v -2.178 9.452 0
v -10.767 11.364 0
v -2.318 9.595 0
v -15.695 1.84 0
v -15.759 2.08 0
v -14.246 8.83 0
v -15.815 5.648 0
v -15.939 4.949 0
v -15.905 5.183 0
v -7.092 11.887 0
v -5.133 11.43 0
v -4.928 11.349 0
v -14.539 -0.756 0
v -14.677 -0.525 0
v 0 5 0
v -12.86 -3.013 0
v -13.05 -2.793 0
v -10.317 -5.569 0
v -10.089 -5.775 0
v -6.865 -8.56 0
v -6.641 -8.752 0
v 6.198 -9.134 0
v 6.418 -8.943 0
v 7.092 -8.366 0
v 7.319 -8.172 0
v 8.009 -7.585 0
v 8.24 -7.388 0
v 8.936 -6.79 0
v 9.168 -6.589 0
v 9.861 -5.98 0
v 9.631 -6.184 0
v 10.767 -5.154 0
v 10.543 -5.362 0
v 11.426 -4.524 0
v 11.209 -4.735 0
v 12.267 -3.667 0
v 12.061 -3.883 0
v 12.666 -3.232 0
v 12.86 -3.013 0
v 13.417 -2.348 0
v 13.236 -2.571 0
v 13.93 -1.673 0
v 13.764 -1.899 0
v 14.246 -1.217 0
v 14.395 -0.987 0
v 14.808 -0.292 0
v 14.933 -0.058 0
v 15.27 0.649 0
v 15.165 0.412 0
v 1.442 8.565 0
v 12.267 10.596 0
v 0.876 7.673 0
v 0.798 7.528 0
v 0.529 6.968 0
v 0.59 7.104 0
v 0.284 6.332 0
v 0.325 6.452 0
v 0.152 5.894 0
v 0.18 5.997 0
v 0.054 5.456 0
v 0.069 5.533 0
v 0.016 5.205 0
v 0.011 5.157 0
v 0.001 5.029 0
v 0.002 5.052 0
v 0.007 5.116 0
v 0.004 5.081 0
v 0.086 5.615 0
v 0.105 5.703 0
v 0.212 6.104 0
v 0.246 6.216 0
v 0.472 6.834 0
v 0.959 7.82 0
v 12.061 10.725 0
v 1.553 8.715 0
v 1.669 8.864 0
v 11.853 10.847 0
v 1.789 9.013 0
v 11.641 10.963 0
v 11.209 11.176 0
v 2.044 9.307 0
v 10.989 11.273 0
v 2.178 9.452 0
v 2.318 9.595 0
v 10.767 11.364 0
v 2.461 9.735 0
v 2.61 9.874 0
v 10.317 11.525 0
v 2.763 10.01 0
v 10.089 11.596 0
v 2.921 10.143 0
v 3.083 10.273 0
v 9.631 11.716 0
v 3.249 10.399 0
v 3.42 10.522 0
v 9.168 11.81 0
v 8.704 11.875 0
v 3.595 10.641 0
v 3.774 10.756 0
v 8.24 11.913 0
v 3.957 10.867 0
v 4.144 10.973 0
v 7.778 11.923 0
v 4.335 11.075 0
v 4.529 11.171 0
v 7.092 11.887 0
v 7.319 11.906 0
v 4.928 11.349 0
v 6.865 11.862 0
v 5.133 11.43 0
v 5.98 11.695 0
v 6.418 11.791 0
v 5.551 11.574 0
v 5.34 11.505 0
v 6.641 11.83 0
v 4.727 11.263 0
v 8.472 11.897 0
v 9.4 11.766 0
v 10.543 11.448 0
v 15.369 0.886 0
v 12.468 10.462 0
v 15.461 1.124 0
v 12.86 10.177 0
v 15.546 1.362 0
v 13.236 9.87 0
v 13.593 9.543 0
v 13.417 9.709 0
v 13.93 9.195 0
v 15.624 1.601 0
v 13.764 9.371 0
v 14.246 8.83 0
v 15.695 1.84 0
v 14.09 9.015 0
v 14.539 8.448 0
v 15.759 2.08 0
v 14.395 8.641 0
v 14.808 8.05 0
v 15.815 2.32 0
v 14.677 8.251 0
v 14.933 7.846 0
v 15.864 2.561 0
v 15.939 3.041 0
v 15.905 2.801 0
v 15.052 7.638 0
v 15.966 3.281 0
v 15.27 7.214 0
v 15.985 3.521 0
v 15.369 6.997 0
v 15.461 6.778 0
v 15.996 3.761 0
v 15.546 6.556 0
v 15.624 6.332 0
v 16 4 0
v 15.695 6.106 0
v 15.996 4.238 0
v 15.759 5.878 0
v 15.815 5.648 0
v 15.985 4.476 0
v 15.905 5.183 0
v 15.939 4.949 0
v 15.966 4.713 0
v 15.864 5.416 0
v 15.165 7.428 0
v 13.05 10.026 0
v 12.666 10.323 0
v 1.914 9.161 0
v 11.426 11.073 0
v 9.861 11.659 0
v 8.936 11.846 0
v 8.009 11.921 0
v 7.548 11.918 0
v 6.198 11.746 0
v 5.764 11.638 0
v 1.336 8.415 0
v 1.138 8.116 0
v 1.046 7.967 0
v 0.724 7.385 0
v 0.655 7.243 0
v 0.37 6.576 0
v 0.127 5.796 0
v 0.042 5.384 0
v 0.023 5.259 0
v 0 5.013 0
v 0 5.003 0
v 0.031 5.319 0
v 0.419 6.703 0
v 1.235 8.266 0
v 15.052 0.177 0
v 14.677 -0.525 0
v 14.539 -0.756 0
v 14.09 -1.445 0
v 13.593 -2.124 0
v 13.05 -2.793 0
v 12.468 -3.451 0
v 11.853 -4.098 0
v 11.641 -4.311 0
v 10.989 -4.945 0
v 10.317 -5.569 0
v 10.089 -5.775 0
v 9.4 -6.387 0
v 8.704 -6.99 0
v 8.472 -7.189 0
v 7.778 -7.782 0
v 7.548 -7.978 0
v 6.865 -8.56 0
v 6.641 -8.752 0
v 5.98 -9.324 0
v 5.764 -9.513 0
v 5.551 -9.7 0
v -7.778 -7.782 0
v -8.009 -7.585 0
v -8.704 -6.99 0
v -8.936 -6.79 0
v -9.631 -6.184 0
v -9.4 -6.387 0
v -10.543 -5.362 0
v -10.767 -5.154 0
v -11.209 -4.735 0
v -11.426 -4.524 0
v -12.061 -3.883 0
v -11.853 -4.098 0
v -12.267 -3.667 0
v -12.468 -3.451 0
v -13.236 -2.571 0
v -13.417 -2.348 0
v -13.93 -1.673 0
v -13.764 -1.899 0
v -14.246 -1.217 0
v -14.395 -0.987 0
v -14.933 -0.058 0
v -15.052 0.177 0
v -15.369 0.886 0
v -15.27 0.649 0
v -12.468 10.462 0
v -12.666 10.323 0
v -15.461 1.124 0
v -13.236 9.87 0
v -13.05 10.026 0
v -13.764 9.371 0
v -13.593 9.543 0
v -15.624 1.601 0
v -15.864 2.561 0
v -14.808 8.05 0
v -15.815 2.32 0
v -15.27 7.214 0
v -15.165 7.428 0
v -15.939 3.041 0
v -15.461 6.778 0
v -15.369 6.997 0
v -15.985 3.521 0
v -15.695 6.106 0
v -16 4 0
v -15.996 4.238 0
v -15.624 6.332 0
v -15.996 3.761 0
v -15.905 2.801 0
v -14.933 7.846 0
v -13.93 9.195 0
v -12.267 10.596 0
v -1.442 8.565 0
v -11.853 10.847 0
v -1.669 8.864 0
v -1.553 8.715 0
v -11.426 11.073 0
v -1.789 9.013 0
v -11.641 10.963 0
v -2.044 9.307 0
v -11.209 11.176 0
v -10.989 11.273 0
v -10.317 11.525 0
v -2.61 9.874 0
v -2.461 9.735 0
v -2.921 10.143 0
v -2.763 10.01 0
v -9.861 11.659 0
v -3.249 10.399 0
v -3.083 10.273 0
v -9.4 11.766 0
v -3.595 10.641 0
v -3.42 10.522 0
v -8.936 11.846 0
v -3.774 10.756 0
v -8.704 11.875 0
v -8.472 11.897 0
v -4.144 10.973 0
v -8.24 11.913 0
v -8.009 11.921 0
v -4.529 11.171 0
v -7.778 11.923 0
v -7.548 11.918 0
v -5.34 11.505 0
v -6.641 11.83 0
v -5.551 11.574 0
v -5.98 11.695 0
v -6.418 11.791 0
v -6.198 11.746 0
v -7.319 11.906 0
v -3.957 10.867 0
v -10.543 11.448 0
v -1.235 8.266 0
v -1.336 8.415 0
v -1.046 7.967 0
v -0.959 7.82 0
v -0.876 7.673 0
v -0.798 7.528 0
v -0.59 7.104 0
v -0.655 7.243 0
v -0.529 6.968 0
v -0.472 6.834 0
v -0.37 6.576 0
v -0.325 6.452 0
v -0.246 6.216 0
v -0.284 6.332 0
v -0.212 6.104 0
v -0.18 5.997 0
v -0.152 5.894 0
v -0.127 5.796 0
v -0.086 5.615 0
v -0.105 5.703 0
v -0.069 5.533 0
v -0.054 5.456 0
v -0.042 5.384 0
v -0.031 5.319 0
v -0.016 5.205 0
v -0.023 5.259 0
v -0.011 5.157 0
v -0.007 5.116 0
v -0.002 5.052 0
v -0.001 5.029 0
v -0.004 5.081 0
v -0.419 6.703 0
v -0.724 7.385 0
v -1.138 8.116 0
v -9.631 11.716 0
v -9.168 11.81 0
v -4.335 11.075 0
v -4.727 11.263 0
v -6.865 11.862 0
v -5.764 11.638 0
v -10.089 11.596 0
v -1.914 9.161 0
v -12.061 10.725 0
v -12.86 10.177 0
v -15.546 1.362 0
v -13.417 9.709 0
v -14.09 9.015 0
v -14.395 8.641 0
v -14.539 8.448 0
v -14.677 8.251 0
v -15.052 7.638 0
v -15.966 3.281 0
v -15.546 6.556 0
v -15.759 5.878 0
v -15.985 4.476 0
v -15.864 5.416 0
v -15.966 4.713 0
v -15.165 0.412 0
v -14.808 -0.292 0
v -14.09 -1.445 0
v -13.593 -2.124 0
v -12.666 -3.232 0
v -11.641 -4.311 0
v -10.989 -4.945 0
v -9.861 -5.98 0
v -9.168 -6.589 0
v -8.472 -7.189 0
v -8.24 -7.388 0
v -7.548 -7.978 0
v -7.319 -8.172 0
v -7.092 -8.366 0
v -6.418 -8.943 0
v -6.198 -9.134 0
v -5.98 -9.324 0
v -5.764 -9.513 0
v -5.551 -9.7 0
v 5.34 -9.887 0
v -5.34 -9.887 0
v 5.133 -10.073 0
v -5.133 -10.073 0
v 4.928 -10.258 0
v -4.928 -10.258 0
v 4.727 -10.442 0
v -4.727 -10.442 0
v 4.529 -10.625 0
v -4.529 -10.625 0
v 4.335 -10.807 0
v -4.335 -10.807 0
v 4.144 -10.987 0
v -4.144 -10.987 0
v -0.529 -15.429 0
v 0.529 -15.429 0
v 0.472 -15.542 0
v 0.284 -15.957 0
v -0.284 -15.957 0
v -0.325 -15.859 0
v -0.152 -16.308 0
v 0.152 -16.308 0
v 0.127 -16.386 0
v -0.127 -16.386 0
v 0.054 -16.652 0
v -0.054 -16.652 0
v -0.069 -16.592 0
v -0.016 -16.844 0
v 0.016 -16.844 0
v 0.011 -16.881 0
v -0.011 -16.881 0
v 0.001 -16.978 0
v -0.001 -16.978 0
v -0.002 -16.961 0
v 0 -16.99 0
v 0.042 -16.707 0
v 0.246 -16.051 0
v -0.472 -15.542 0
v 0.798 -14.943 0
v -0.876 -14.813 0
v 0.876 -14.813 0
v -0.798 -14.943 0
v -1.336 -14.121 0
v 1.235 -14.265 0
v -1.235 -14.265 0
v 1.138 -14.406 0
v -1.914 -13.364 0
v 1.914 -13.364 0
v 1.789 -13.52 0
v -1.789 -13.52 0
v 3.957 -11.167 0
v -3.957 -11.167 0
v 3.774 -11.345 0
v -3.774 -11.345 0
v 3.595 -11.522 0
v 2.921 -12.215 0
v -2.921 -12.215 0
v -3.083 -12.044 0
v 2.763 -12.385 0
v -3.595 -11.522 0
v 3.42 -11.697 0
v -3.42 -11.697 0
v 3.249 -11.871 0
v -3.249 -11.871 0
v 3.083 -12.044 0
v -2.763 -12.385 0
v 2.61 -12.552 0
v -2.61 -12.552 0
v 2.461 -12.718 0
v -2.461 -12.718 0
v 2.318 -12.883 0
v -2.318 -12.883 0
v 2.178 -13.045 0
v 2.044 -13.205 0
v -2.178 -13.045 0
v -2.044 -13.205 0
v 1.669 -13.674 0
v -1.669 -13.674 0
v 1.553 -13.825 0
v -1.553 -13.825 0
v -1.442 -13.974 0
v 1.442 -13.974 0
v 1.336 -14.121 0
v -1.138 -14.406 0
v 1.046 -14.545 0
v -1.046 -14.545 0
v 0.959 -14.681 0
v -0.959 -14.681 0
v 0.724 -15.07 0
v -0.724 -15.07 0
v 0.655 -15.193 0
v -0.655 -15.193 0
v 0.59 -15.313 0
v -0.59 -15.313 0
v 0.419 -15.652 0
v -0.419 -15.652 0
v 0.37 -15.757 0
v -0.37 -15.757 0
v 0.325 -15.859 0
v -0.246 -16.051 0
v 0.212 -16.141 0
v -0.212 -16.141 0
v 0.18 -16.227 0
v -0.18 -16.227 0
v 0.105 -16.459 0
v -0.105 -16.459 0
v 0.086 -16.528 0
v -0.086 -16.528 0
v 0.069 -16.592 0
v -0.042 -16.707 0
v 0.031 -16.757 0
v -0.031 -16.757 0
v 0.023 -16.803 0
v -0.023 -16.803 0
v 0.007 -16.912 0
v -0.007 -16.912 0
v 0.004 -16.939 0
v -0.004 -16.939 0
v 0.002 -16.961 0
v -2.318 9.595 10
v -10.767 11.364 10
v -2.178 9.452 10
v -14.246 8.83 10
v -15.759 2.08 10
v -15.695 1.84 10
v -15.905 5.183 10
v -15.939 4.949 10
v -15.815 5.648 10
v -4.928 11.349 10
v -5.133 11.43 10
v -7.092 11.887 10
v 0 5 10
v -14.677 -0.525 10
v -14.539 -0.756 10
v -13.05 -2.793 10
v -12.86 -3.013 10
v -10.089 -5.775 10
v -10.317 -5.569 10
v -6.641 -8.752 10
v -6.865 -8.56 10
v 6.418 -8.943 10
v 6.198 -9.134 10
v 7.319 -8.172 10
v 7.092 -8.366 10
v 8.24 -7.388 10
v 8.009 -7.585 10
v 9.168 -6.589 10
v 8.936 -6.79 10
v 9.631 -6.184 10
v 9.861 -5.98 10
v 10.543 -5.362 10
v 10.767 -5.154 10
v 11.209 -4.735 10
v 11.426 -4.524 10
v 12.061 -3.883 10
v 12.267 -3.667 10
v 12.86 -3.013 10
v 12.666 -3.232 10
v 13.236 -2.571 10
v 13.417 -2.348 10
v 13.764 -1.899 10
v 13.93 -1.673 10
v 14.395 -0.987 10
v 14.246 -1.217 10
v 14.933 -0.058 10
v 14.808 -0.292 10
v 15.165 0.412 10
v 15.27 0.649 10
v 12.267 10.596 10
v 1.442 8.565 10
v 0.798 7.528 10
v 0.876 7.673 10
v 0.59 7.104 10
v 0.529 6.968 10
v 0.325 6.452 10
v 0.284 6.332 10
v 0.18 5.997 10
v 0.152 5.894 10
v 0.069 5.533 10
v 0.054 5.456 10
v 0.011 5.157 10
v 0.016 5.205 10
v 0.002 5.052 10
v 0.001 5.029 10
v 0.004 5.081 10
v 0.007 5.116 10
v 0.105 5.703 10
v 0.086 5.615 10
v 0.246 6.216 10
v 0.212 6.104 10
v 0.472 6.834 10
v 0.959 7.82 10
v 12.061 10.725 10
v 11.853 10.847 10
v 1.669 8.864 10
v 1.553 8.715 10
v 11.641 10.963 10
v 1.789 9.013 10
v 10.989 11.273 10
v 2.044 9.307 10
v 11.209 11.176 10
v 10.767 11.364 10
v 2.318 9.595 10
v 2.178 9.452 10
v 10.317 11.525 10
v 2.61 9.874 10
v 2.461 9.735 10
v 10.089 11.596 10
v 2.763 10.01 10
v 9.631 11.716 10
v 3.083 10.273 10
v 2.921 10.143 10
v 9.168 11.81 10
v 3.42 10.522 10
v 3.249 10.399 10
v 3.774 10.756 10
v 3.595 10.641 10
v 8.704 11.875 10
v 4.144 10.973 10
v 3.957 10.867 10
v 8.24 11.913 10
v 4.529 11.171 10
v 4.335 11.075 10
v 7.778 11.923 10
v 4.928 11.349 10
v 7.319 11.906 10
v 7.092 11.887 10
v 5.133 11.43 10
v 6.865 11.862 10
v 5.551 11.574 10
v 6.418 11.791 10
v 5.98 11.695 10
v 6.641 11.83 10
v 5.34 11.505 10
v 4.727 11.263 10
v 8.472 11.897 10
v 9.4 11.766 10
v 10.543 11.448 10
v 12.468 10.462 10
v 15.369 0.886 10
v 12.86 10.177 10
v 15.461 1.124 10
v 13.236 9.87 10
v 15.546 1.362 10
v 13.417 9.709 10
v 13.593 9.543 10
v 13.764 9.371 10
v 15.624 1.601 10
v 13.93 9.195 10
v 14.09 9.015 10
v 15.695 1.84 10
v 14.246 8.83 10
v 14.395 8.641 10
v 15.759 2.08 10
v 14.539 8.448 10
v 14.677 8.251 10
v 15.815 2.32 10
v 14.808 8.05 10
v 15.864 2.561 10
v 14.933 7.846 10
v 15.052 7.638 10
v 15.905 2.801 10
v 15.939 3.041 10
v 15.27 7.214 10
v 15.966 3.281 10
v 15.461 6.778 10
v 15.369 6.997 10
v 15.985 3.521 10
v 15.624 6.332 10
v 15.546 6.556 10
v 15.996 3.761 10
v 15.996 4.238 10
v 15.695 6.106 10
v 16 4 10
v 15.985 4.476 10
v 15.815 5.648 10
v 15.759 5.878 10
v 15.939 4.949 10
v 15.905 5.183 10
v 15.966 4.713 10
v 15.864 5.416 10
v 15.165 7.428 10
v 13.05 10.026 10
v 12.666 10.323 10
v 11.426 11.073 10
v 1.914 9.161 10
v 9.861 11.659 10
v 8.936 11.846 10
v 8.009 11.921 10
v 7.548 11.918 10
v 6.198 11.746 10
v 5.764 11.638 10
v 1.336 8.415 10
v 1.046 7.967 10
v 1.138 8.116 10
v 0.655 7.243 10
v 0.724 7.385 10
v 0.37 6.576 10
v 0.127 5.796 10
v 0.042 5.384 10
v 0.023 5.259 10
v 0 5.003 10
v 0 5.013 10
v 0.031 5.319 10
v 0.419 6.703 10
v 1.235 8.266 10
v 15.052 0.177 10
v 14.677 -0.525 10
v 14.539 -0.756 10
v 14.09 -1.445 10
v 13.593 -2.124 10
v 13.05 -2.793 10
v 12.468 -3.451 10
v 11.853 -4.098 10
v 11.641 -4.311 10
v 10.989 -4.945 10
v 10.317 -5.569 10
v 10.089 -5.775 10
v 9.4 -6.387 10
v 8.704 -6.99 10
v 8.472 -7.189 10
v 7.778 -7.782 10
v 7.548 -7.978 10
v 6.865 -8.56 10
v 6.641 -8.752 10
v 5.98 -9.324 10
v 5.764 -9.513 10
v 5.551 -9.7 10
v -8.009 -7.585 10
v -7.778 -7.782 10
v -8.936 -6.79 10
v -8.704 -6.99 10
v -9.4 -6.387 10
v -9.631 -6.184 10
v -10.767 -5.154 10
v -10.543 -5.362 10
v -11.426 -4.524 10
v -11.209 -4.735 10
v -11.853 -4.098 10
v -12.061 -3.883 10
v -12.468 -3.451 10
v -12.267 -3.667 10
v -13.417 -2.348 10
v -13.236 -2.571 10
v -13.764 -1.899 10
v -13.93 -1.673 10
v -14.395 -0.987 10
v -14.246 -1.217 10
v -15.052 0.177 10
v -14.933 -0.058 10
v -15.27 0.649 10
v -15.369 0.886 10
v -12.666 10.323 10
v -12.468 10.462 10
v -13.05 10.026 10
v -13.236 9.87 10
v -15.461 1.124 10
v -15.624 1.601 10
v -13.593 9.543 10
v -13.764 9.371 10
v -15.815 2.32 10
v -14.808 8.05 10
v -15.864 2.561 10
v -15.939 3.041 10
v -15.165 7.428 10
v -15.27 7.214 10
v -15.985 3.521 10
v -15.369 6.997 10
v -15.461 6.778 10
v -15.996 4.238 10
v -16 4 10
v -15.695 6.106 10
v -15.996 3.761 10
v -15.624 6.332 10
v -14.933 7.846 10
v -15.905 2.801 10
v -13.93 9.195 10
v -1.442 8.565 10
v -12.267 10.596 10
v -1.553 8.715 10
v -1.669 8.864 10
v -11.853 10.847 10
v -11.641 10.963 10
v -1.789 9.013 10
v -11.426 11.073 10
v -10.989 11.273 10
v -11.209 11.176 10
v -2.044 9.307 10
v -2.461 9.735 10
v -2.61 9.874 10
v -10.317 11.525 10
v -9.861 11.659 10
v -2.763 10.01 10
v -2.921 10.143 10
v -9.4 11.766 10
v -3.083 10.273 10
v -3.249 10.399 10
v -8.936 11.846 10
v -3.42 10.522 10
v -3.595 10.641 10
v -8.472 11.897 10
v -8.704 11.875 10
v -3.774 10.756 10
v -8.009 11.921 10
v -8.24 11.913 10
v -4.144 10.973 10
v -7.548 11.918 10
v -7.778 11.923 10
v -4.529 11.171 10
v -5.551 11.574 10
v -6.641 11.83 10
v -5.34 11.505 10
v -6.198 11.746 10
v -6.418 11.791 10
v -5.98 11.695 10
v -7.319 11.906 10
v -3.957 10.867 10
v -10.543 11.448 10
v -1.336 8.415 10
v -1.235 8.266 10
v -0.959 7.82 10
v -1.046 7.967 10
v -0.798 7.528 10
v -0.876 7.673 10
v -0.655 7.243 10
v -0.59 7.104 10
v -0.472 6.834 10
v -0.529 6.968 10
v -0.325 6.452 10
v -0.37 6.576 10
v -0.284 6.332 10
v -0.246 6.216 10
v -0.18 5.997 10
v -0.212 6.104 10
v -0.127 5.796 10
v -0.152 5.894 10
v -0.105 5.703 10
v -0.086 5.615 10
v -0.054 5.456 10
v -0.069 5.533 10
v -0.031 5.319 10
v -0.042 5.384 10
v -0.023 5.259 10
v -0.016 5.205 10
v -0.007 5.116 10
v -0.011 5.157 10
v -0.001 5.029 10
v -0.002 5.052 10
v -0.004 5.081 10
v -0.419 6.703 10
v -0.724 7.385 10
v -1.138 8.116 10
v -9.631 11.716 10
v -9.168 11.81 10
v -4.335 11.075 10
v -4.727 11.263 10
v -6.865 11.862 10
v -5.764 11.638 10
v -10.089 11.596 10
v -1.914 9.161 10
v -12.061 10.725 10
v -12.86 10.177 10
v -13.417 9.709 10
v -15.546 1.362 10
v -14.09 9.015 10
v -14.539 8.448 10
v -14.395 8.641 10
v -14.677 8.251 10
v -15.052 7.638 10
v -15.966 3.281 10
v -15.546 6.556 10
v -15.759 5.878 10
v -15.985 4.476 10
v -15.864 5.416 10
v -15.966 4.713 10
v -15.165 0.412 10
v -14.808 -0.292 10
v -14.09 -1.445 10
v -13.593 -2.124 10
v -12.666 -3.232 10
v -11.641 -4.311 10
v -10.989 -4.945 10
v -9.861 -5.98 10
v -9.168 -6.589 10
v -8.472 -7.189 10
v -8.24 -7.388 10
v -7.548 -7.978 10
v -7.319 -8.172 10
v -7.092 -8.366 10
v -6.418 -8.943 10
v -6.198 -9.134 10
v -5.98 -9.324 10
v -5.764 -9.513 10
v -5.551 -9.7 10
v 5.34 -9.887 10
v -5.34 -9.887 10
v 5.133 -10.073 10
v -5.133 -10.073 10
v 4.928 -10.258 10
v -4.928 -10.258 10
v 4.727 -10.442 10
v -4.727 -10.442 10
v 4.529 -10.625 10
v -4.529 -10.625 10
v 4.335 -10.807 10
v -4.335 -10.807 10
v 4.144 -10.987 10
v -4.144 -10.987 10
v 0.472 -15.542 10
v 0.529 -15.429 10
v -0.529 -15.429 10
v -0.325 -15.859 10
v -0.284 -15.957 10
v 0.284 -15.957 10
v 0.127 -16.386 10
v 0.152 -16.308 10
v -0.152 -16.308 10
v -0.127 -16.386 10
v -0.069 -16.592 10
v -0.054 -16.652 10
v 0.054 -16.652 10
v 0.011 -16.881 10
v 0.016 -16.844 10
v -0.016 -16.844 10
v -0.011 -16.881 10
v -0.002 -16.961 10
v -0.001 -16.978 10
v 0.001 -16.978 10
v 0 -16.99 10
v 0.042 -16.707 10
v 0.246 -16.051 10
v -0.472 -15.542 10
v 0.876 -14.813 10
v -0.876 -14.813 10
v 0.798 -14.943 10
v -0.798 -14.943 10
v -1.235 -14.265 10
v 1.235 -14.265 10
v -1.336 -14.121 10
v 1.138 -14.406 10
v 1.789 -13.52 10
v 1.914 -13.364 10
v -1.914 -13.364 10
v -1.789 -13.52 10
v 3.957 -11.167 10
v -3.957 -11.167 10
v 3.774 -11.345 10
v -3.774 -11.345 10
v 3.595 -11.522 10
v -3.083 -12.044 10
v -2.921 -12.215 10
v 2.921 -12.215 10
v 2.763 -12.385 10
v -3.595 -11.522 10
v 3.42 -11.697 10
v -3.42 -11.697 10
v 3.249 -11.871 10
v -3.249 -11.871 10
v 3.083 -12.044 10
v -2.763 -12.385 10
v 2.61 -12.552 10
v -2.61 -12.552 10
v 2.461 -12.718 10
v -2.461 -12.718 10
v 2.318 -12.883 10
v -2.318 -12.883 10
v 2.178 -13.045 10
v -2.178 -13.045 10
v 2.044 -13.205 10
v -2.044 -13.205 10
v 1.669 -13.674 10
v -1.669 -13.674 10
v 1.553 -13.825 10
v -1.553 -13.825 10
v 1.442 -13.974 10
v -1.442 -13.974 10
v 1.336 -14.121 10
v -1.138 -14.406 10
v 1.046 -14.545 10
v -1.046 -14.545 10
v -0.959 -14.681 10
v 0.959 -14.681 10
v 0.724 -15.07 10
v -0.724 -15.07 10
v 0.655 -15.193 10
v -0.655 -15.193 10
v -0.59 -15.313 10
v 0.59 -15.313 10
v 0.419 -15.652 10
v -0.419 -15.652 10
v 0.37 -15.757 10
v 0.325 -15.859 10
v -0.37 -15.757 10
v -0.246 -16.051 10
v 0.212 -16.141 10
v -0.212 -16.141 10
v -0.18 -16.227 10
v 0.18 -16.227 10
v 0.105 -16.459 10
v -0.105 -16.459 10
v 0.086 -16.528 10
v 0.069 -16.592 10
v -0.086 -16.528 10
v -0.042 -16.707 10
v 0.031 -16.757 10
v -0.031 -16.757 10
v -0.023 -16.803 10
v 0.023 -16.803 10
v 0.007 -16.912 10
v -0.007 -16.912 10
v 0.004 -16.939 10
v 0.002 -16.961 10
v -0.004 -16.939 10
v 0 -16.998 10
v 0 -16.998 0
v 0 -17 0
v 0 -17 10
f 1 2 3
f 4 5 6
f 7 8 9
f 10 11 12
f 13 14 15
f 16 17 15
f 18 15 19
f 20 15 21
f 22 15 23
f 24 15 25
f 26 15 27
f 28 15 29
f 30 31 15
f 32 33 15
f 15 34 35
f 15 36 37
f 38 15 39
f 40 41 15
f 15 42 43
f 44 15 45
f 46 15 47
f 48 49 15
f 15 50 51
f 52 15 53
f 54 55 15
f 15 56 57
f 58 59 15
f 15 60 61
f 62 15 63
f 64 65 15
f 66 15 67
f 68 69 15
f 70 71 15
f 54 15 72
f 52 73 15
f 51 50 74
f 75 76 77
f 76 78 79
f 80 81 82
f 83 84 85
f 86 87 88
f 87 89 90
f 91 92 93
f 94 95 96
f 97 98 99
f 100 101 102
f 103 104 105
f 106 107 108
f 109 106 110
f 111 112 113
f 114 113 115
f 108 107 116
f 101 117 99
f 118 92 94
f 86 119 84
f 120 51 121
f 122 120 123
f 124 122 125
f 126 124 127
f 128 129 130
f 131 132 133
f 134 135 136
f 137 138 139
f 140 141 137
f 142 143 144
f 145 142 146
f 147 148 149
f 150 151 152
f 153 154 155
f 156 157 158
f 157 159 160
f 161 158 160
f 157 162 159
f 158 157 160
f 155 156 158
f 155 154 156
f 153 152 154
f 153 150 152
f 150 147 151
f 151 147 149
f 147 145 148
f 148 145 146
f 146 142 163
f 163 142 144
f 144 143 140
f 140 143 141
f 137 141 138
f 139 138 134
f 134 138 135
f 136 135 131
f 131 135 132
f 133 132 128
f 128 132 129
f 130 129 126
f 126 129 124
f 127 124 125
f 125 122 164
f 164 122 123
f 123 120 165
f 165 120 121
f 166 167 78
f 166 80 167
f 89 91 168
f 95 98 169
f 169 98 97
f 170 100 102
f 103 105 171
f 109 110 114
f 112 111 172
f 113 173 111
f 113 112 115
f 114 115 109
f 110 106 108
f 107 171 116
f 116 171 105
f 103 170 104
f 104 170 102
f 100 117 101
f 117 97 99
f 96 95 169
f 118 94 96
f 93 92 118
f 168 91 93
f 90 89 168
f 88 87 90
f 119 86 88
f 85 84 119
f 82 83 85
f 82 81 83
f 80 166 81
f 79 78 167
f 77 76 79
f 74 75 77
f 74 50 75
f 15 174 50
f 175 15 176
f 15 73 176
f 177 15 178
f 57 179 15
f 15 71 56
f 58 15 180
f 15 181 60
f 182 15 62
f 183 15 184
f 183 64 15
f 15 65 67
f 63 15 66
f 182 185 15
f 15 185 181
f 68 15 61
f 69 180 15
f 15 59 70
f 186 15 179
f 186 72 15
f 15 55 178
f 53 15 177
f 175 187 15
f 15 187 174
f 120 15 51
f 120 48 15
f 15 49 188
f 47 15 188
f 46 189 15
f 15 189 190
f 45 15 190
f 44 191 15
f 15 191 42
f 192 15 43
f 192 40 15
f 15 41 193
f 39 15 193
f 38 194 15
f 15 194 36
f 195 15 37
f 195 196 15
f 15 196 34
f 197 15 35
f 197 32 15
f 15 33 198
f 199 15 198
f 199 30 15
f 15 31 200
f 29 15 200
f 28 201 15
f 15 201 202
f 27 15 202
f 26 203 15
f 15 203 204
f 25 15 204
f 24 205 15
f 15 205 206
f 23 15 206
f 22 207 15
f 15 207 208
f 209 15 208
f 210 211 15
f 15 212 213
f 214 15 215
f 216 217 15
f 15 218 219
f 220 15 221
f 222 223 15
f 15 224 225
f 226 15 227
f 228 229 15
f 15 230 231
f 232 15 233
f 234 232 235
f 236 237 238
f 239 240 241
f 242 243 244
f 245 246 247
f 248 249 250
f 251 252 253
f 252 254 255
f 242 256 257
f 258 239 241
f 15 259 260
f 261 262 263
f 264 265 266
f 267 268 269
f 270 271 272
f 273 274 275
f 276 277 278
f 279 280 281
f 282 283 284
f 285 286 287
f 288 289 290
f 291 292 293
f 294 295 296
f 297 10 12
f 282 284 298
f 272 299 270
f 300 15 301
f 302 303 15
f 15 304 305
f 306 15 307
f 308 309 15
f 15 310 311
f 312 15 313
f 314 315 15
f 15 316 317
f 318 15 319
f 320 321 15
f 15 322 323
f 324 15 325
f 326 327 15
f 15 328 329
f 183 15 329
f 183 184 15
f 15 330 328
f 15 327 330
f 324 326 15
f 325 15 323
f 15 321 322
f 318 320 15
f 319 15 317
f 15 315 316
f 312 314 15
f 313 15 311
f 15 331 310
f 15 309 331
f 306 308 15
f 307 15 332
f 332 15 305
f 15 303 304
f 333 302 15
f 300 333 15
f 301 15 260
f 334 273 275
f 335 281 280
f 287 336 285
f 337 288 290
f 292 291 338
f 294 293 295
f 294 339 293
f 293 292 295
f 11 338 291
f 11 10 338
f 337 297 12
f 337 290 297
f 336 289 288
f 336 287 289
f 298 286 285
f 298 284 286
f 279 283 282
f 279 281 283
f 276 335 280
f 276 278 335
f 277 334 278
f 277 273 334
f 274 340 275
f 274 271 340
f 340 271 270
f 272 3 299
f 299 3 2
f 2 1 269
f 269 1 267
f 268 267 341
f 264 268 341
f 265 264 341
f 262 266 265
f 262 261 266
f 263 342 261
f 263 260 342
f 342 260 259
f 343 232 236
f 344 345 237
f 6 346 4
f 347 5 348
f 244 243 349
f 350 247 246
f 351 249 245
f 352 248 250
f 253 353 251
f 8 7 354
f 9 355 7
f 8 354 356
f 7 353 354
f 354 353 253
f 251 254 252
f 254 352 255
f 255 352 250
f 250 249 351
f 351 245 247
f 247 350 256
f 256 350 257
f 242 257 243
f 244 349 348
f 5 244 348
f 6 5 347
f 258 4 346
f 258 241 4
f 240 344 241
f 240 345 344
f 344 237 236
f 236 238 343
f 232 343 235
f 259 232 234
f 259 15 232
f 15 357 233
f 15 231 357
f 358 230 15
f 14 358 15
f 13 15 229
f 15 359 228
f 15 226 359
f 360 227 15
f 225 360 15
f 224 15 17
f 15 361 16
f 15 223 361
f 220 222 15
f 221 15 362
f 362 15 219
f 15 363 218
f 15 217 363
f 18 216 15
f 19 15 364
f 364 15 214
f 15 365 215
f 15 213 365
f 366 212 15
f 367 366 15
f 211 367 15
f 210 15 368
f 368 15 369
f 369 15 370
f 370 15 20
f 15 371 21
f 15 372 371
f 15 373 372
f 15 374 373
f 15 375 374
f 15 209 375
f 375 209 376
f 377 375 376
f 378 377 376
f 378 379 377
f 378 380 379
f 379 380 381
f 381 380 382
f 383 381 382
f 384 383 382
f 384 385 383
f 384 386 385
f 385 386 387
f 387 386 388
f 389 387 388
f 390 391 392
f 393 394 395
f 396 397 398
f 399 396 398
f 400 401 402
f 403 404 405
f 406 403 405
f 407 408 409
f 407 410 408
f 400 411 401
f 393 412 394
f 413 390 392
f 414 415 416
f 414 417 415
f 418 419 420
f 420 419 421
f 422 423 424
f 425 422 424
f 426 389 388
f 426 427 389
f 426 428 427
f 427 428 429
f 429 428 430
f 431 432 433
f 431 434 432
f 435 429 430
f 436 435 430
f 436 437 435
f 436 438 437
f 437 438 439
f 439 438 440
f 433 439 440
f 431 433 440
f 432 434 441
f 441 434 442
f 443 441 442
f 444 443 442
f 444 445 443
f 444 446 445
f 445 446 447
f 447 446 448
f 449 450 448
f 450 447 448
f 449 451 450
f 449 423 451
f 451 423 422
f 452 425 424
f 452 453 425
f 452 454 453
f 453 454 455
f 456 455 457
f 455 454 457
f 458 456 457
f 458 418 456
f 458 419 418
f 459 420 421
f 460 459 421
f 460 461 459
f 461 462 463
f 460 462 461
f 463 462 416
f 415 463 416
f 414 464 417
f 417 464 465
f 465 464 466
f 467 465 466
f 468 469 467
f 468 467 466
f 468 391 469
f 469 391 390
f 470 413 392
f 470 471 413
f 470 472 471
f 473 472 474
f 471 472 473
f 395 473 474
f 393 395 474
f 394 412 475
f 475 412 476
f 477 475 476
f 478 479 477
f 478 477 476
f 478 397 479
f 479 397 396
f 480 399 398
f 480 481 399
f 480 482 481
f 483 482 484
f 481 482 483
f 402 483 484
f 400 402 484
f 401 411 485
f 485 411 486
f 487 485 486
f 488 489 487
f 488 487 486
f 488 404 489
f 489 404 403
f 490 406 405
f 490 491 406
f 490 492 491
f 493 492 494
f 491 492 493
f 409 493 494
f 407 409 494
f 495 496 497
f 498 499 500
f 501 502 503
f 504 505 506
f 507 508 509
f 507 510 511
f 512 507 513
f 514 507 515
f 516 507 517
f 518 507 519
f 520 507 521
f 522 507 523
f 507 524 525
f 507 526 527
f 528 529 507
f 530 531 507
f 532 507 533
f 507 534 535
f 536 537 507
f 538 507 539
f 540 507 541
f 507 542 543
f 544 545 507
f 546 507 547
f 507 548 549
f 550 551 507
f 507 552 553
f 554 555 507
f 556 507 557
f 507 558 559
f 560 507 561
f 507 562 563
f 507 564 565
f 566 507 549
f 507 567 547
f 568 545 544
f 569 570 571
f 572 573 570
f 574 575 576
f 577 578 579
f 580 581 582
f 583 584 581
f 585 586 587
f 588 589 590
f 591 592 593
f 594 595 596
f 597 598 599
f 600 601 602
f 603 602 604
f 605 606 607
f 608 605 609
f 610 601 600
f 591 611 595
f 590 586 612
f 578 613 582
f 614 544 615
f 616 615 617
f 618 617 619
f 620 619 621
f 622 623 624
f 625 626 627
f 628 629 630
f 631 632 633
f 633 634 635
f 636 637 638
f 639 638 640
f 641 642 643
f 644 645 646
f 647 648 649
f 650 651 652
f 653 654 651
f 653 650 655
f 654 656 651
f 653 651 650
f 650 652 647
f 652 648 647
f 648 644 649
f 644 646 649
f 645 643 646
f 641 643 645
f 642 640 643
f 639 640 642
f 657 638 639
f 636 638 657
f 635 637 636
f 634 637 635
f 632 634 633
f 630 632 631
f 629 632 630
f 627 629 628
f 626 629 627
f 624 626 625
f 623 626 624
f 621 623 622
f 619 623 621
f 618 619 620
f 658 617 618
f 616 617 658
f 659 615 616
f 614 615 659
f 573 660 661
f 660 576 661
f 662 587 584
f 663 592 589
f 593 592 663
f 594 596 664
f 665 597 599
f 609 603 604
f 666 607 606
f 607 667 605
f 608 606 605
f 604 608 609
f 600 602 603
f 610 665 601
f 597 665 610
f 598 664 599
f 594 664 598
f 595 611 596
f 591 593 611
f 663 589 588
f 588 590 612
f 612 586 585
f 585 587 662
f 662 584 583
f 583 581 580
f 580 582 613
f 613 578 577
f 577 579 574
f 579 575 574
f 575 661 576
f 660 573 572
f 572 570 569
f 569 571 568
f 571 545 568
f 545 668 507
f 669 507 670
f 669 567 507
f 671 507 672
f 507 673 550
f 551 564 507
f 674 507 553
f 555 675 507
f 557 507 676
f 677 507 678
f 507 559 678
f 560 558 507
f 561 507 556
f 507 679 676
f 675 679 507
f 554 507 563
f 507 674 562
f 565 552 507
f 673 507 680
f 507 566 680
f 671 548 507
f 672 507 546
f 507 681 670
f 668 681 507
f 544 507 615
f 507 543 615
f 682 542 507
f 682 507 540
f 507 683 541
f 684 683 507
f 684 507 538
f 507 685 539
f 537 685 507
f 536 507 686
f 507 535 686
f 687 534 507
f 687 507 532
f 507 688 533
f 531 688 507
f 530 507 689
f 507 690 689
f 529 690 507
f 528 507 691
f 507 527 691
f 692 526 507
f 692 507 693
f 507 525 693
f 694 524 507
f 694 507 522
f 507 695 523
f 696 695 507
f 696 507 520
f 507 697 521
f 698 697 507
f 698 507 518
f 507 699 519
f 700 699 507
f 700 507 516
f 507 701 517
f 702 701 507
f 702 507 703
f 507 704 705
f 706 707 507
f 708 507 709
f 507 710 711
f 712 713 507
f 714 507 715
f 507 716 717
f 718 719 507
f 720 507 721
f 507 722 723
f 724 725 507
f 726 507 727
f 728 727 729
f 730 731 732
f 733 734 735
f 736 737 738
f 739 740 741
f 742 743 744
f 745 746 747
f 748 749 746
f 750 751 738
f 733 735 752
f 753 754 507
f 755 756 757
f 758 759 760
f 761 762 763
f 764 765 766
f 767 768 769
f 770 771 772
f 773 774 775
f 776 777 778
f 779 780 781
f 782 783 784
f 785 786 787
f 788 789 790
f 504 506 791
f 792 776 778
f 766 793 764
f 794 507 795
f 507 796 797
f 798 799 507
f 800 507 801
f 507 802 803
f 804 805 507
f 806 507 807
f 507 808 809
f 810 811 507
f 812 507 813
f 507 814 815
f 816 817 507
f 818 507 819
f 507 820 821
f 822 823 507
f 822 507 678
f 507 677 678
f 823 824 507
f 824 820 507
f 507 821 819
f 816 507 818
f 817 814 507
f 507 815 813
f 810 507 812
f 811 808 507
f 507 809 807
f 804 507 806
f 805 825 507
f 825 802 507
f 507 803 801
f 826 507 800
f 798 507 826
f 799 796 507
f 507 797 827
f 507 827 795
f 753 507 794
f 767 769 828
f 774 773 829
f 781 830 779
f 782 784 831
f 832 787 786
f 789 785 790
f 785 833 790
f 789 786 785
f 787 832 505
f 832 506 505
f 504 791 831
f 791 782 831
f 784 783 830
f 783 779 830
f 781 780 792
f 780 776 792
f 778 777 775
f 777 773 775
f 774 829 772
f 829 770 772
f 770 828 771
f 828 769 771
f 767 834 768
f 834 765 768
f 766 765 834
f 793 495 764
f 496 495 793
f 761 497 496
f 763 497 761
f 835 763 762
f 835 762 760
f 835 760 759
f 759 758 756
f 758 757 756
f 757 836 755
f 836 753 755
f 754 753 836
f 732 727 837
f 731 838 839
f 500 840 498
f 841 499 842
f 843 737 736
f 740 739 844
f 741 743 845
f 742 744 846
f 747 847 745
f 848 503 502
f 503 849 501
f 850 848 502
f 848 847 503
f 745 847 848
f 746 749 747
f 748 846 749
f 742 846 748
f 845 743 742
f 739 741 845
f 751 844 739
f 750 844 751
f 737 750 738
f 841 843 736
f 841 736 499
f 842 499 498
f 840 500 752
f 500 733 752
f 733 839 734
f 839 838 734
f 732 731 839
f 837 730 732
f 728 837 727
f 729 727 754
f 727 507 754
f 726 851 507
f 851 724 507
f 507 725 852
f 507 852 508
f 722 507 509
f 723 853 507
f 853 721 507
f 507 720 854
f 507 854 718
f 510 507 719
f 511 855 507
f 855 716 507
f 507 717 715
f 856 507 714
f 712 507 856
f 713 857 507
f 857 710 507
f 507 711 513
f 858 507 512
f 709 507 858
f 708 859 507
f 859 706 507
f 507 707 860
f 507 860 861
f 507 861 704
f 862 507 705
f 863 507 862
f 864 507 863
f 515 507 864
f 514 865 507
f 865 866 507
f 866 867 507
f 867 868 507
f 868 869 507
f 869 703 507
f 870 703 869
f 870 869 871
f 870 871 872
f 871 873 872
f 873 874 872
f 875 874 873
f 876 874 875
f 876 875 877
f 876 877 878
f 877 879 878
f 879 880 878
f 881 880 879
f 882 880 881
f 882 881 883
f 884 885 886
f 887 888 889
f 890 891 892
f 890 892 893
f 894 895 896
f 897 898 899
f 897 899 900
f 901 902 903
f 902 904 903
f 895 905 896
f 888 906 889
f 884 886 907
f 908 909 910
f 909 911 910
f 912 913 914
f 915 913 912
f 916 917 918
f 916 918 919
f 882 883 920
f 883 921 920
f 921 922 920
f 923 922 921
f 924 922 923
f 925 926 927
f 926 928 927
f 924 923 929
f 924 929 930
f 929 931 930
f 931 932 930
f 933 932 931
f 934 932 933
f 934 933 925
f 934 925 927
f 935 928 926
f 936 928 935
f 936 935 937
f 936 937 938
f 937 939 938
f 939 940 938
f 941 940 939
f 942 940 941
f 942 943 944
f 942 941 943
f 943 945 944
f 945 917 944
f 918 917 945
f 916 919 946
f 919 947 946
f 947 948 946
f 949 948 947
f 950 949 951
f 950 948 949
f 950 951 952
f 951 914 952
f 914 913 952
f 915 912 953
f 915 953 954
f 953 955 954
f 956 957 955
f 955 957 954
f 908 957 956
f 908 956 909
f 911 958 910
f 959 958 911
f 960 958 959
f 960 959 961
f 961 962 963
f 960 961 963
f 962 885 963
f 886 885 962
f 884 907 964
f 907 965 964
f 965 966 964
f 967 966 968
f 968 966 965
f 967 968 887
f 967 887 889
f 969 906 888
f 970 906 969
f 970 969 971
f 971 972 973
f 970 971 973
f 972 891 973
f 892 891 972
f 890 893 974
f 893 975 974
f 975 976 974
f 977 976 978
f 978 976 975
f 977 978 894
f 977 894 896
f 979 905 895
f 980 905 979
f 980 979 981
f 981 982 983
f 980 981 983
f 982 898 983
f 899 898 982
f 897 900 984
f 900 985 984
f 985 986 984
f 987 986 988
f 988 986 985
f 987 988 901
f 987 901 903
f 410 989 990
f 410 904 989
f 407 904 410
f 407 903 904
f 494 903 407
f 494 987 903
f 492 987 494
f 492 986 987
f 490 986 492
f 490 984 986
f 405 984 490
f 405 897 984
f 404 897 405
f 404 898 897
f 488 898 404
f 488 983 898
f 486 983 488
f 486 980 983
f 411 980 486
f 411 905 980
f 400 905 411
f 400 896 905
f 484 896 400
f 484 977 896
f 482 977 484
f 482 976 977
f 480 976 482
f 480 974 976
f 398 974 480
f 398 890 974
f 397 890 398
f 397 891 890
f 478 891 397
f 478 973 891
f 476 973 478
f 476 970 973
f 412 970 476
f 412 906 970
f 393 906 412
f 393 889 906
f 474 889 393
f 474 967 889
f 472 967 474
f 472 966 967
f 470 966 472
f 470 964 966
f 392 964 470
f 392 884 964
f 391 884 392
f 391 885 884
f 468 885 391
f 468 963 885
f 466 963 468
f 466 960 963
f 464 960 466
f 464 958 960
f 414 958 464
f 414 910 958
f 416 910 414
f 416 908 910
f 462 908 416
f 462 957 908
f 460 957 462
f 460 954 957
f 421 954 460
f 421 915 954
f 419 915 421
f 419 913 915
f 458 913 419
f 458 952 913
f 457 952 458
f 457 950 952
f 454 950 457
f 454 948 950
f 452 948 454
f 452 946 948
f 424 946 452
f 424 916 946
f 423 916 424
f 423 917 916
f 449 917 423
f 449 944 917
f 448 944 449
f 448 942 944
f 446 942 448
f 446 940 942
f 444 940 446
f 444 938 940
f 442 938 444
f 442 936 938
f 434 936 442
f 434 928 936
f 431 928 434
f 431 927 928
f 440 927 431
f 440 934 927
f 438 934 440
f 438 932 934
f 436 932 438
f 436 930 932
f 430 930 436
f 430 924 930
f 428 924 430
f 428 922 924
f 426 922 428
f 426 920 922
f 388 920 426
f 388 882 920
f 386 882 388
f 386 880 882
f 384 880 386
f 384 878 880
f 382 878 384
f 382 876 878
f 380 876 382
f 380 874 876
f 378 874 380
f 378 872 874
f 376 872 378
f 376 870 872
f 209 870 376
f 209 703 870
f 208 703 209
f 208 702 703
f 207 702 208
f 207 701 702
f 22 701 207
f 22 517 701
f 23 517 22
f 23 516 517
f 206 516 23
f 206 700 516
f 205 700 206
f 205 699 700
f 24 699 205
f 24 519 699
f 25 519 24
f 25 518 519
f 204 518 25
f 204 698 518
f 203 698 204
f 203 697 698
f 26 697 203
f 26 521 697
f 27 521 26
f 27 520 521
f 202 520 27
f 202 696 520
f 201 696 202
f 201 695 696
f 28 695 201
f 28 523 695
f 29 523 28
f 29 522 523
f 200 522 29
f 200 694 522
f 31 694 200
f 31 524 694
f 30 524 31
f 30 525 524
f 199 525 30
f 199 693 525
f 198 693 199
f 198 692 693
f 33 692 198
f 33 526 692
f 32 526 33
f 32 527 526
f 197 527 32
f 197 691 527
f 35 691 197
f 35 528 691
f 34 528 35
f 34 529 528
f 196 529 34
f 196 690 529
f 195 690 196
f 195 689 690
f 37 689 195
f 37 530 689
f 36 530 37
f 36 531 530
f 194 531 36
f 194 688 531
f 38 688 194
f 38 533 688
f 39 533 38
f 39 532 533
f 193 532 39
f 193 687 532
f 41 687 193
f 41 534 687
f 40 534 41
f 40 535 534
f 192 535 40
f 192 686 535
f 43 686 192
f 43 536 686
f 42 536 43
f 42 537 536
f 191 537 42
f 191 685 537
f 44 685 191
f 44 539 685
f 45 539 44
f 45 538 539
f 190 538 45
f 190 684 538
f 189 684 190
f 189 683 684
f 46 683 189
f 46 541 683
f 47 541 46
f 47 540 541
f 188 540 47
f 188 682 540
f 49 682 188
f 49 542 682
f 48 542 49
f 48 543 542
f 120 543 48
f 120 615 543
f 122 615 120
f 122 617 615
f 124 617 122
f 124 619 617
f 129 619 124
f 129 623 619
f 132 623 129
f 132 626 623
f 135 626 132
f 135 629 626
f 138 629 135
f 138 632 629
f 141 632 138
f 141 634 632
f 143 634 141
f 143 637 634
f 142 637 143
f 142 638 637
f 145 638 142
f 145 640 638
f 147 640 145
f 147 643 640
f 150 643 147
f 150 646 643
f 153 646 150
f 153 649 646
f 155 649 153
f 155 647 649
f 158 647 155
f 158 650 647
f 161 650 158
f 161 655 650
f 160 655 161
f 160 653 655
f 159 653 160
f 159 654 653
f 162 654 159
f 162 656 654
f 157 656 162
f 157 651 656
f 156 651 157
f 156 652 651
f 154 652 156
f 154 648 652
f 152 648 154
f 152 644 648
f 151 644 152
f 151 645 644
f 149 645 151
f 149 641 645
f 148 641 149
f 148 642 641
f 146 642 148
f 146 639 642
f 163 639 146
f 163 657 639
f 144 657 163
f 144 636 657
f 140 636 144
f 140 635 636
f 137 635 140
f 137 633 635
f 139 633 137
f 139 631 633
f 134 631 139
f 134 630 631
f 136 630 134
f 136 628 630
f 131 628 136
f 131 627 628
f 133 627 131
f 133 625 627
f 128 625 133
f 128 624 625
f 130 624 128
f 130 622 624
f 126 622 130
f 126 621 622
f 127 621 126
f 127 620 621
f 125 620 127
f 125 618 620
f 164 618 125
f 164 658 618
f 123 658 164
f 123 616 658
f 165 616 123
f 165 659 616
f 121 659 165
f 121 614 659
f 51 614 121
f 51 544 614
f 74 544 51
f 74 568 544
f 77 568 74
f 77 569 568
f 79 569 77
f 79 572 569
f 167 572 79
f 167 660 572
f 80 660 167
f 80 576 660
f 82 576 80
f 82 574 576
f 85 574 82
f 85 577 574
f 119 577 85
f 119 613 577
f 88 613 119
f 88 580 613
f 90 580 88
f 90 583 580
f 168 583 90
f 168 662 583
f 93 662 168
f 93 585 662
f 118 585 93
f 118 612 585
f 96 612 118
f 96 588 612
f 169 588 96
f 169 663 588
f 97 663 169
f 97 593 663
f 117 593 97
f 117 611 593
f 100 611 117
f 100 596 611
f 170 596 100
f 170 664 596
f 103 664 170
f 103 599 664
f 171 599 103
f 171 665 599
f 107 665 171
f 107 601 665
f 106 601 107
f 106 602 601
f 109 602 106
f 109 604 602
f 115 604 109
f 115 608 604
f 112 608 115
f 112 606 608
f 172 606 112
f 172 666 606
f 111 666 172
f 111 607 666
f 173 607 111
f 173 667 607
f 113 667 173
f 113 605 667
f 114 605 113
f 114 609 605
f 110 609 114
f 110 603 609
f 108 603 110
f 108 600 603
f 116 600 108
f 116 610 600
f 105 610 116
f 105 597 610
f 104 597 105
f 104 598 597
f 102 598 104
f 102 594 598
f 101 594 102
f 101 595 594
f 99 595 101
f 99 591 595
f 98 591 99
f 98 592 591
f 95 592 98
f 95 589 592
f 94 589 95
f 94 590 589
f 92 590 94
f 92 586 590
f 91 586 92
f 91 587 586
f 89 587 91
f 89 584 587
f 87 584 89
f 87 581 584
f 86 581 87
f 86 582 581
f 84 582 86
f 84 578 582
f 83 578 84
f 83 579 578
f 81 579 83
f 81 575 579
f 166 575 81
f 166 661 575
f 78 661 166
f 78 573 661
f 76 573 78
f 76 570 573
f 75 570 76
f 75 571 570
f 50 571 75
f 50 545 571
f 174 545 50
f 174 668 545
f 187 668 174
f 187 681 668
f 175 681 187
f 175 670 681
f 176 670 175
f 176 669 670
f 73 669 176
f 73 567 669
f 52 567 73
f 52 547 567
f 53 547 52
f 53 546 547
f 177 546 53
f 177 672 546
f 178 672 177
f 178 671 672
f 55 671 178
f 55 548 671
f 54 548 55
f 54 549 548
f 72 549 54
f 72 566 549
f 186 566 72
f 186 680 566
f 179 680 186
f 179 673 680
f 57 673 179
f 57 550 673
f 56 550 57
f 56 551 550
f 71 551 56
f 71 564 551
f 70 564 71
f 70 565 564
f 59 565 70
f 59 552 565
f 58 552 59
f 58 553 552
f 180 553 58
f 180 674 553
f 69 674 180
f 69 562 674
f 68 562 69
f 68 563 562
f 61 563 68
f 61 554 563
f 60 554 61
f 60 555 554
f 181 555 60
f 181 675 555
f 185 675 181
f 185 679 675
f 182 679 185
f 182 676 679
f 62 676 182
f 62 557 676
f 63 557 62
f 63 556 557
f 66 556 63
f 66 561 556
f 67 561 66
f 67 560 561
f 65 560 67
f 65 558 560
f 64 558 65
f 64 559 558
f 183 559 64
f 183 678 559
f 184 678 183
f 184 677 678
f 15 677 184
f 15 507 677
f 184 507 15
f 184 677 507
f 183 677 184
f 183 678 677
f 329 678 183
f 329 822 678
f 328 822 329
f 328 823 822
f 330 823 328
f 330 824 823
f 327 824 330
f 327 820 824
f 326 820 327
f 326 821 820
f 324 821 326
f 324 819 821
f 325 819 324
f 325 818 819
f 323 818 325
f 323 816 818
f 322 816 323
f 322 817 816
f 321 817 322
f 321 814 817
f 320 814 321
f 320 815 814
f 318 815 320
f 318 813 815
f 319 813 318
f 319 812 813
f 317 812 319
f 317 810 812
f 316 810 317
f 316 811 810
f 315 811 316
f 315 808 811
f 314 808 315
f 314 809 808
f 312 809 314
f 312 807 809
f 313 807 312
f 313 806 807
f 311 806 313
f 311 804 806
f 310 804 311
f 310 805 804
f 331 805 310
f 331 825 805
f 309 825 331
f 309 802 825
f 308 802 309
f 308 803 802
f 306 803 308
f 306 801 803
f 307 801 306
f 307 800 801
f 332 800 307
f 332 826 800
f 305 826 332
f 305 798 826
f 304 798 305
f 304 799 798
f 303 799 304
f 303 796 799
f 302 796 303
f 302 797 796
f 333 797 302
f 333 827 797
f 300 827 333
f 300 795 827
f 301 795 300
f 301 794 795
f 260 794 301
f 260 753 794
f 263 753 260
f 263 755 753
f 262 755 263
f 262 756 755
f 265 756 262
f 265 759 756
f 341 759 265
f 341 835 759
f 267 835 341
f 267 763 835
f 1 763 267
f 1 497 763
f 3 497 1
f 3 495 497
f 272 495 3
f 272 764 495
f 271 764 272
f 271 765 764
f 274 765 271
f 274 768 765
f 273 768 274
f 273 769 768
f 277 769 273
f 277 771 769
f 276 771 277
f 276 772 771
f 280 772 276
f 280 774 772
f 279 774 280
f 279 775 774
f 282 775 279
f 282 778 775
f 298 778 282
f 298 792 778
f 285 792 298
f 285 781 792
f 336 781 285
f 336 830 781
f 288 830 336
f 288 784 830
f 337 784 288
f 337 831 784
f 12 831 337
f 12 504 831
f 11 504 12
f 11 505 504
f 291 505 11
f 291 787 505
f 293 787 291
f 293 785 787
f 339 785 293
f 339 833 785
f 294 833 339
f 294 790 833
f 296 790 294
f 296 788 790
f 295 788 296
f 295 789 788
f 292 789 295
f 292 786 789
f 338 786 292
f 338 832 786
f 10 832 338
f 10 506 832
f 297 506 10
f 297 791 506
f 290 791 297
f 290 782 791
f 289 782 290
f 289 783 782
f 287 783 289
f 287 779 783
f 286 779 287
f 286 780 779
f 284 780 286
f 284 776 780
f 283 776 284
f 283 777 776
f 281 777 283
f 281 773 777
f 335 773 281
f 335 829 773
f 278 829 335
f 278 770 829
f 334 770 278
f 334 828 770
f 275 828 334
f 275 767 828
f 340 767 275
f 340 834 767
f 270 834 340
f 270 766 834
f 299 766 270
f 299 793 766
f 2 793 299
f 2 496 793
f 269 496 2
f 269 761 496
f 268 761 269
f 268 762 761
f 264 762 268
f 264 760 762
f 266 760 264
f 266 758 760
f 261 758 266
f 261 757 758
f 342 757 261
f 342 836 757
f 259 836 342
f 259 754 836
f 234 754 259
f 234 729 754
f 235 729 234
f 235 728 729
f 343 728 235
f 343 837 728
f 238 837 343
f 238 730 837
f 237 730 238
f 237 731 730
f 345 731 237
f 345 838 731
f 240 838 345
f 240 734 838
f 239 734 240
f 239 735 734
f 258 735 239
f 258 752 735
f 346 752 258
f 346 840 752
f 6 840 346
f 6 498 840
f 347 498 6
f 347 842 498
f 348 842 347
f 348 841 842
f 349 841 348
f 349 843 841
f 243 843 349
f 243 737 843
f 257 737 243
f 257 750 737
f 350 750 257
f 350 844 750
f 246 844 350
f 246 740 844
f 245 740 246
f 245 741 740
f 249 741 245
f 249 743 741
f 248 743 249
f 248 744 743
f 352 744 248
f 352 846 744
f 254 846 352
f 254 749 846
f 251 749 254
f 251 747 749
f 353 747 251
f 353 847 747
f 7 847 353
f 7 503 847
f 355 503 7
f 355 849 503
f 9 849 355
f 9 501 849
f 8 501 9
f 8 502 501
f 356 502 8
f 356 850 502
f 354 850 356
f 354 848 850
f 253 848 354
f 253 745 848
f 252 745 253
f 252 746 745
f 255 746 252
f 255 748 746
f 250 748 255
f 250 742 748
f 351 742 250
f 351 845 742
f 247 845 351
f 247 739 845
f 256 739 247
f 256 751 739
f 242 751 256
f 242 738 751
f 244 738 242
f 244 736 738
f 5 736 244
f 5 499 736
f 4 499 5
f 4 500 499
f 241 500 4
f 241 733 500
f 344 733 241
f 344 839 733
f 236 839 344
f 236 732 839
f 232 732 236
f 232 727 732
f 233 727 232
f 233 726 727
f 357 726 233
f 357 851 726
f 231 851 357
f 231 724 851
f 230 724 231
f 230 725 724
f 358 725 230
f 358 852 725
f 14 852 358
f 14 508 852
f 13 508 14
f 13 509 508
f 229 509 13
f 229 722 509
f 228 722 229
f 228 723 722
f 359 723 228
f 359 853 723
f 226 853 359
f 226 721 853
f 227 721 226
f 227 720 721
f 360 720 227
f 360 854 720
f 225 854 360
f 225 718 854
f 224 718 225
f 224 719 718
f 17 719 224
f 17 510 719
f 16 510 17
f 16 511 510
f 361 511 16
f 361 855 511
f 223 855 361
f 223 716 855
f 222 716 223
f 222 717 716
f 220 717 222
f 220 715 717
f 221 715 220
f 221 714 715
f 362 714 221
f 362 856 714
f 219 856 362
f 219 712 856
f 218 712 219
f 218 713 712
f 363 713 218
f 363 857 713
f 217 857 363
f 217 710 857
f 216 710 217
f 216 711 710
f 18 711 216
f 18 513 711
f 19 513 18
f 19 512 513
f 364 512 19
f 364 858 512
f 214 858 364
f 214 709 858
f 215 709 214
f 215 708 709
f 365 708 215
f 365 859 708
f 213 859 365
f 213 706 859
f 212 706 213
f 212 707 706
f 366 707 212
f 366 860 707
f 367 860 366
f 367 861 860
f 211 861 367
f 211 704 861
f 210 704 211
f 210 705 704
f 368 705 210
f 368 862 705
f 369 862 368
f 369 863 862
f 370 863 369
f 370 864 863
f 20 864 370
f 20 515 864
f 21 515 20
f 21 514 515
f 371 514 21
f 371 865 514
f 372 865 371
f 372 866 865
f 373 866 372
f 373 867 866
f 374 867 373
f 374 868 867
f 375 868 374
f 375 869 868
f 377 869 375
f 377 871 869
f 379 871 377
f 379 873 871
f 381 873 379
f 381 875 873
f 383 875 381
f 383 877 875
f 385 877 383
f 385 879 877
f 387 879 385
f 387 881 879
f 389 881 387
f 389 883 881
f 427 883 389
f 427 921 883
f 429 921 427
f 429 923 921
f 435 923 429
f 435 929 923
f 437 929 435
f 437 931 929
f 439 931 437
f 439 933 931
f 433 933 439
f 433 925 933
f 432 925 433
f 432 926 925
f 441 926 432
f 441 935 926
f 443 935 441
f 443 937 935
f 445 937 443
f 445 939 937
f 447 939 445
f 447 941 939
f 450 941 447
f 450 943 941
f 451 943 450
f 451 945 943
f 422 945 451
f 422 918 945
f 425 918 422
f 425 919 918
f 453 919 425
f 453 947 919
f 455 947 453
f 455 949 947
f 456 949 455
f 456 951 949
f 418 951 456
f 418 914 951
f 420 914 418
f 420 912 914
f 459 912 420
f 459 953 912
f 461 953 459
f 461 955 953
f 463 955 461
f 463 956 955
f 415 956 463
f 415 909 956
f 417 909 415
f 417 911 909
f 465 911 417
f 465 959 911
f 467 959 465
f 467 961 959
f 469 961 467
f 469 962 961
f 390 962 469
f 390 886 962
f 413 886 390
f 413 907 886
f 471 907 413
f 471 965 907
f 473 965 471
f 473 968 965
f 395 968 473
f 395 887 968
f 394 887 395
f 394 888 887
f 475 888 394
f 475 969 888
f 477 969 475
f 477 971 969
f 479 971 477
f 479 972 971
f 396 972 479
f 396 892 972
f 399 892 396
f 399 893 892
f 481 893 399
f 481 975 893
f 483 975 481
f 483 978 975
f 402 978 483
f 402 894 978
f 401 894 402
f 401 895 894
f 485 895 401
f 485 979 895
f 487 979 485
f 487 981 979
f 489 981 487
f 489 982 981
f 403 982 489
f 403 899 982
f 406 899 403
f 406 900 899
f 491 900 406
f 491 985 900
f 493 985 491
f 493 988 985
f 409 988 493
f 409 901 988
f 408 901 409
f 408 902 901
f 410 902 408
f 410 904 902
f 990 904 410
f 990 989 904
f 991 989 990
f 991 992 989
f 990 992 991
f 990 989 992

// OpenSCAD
n=500;
h = 10;
function heart_coordinates(t) = [16*pow(sin(t),3), 13*cos(t) - 5*cos(2*t) - 2*cos(3*t) - cos(4*t)];
function heart_points(n=50) = [ for (t=[0:360/n:359.999]) heart_coordinates(t)];
points = heart_points(n=n);
linear_extrude(height=h)
    polygon(points);
